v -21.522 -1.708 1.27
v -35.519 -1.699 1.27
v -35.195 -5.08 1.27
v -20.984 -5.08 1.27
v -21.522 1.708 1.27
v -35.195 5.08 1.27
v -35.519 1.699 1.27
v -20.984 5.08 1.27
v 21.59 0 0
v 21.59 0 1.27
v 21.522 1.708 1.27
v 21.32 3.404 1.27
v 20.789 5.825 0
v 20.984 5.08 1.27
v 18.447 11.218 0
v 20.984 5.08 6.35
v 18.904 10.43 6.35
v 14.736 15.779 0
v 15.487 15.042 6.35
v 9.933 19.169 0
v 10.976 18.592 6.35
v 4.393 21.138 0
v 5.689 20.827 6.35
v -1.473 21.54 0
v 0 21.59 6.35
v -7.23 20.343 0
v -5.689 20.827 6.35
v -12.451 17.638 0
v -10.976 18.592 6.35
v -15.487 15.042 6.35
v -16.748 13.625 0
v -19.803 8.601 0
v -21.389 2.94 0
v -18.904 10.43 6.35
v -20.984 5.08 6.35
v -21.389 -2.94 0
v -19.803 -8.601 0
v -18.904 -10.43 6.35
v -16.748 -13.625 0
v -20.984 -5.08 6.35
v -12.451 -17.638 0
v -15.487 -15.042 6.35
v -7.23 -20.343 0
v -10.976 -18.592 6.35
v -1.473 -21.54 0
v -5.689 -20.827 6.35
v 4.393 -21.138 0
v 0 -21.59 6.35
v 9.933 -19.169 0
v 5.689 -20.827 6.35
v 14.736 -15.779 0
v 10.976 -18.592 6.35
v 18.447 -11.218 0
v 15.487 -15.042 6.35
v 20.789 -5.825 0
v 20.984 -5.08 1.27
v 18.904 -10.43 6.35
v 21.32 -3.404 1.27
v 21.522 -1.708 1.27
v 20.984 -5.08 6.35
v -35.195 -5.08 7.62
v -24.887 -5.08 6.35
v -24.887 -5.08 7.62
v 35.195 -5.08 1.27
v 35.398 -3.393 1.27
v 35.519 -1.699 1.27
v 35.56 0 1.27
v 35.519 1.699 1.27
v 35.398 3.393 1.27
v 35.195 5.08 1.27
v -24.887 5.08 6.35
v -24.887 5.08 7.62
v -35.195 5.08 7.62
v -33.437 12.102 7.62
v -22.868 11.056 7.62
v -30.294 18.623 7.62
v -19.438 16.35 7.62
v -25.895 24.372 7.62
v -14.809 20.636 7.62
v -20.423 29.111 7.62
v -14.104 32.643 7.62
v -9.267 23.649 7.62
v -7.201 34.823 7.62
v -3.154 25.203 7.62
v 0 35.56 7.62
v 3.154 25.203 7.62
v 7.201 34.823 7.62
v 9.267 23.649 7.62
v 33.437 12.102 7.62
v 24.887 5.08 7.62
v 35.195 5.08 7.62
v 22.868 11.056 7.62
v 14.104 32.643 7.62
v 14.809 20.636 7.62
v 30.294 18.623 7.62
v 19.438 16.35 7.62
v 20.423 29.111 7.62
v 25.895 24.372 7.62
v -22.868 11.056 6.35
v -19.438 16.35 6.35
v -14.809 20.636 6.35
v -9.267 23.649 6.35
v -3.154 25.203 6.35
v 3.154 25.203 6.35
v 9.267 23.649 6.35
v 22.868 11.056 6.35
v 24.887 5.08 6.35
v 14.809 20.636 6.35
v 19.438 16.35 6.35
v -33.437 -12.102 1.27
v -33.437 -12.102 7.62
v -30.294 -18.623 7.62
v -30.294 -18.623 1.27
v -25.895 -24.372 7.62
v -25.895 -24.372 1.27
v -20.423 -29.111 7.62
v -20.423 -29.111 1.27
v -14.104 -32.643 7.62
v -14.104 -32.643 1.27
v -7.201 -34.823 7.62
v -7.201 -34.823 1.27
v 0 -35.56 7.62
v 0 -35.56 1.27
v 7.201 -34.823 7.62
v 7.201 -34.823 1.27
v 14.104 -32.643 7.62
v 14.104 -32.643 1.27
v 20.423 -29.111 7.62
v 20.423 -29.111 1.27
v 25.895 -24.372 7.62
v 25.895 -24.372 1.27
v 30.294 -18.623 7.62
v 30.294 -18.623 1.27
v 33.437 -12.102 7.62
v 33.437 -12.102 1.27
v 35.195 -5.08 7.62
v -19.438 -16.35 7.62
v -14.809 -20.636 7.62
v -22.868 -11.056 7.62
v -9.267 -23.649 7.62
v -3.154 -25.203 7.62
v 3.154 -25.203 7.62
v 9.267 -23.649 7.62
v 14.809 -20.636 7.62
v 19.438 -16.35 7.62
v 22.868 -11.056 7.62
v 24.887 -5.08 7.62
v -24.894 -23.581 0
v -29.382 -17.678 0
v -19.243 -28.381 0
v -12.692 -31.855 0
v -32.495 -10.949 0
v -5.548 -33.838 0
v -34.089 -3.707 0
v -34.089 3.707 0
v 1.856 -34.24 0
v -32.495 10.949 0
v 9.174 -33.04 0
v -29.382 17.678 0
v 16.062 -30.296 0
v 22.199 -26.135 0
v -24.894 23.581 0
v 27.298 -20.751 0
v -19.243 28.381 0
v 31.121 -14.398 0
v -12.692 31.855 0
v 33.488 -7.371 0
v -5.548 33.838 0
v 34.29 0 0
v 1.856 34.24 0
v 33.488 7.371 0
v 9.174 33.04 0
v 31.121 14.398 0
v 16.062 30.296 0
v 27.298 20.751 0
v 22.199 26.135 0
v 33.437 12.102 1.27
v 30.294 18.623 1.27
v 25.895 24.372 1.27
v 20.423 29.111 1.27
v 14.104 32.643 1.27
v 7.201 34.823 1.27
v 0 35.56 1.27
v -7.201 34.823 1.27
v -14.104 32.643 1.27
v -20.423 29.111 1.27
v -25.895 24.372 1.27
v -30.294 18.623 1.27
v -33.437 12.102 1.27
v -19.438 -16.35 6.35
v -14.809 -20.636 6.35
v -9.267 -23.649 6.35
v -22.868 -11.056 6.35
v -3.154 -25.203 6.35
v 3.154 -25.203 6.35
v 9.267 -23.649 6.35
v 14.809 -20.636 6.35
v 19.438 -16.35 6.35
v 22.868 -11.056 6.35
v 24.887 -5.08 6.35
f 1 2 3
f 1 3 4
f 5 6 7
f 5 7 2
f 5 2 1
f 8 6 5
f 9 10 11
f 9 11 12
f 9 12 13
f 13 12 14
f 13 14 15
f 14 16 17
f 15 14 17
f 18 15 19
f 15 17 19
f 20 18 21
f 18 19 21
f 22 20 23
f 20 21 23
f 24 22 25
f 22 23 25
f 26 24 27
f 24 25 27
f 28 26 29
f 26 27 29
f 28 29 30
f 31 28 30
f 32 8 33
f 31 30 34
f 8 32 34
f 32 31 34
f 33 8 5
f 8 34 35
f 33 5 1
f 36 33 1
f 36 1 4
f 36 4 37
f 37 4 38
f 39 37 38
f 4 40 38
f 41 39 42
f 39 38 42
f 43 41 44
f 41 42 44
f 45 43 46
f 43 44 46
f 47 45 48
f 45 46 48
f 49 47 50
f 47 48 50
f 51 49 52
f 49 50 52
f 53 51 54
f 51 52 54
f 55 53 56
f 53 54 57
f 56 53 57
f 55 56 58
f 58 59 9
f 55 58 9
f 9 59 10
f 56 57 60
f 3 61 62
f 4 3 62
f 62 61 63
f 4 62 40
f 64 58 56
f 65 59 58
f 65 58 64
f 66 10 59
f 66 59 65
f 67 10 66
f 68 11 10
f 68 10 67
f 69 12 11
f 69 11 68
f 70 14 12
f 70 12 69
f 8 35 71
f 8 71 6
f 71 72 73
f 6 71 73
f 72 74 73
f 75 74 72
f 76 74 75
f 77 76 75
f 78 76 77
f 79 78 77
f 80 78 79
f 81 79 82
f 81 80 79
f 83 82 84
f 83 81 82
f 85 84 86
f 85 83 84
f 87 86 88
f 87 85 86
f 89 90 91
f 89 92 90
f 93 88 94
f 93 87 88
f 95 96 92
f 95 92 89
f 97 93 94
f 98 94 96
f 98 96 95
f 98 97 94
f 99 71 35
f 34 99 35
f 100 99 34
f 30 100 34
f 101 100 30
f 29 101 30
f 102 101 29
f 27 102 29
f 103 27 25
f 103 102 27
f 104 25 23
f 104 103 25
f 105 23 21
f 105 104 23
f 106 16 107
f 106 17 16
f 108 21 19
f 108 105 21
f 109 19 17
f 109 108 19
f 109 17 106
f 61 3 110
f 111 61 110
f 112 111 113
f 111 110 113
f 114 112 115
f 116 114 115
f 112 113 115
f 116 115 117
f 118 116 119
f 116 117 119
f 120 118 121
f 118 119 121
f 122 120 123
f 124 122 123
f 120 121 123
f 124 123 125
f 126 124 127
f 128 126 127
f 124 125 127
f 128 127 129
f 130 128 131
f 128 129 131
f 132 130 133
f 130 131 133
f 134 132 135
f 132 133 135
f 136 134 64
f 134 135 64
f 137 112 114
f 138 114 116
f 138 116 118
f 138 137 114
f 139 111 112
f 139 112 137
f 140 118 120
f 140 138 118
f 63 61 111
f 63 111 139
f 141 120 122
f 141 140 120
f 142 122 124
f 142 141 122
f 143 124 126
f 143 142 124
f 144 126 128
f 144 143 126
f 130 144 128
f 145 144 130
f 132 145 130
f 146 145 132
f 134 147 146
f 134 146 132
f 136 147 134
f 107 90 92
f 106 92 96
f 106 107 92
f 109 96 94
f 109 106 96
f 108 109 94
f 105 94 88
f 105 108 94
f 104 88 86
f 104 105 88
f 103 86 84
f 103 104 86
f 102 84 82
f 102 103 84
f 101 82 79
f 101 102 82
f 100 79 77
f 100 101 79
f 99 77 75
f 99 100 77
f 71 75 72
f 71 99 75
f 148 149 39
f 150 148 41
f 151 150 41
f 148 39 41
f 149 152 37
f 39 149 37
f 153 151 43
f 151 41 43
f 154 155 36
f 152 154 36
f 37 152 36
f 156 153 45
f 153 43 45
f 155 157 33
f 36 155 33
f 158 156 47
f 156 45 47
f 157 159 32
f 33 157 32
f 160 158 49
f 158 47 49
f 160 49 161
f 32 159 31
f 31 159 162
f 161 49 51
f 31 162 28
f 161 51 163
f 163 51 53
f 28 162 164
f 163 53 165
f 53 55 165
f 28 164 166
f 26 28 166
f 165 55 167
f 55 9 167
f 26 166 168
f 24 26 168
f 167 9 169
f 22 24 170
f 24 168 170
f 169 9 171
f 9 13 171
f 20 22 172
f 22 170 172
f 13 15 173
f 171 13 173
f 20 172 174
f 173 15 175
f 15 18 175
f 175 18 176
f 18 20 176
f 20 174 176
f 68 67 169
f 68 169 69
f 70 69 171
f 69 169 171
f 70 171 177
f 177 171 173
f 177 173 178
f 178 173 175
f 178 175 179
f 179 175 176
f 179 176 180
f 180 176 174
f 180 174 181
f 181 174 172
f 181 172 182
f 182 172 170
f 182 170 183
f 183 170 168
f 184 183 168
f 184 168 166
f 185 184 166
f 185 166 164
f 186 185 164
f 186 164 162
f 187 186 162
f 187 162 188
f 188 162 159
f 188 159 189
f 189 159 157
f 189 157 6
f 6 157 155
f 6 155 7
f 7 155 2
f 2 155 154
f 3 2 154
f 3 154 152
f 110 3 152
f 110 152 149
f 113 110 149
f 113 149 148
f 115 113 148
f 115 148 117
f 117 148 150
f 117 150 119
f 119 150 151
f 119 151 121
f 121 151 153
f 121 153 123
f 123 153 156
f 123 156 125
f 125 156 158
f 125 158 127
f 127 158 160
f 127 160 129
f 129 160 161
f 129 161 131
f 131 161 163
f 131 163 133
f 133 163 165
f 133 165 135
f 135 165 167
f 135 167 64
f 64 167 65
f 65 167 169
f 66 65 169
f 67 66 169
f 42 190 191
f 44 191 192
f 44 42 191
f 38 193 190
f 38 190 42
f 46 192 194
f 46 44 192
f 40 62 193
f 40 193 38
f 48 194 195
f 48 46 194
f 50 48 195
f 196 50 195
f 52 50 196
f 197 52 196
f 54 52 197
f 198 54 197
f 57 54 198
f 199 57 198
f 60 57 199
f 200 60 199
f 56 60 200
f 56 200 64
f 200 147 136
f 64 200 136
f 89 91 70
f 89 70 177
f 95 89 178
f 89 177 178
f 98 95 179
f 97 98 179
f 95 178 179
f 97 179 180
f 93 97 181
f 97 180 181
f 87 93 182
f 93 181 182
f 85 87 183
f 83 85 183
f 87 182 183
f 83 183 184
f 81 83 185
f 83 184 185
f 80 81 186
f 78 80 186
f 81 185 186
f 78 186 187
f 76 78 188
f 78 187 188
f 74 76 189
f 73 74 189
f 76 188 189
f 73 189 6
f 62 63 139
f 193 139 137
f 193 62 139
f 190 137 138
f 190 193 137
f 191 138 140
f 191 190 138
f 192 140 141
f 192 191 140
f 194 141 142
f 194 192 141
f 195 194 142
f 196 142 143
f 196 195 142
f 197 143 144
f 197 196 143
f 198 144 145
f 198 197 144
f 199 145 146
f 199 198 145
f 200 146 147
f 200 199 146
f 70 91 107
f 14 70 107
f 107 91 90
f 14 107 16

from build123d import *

# Parameters (mm, degrees)
F0_R     = 35.56
F1_DEPTH = 6.35
F2_R     = 35.56
F2_R_2   = 25.4
F3_DEPTH = 1.27
F4_SIZE  = 1.27
F5_R     = 21.59
F6_DEPTH = 25.4
F8_DEPTH = 6.35


with BuildPart() as f1:
    # F0 (on Top) → F1 (new body)
    with BuildSketch(Plane.XY):
        Circle(F0_R)
    extrude(amount=F1_DEPTH)

    # F2 (on face) → F3 (join)
    with BuildSketch(Plane.XY.offset(6.35)):
        Circle(F2_R)
        Circle(F2_R_2, mode=Mode.SUBTRACT)
    extrude(amount=F3_DEPTH)

    # F4
    f4_edges = [f1.edges().sort_by_distance(p)[0] for p in [
        (-35.56, 0, 0),
    ]]
    chamfer(f4_edges, length=F4_SIZE)

    # F5 (on face) → F6 (cut)
    with BuildSketch(Plane.XY.offset(6.35)):
        Circle(F5_R)
    extrude(amount=-F6_DEPTH, mode=Mode.SUBTRACT)

    # F7 (on face) → F8 (cut)
    with BuildSketch(Plane.XY.offset(7.62)):
        with BuildLine():
            ThreePointArc((-35.1952724098, 5.08), (-35.56, 0), (-35.1952724098, -5.08))
            Line((-35.1952724098, -5.08), (-24.8868157867, -5.08))
            ThreePointArc((-24.8868157867, -5.08), (-25.4, 0), (-24.8868157867, 5.08))
            Line((-24.8868157867, 5.08), (-35.1952724098, 5.08))
        make_face()
        with BuildLine():
            Line((-24.8868157867, -5.08), (24.8868157867, -5.08))
            ThreePointArc((24.8868157867, -5.08), (25.2713782863, -2.5529276349), (25.4, 0))
            ThreePointArc((25.4, 0), (25.2713782863, 2.5529276349), (24.8868157867, 5.08))
            Line((24.8868157867, 5.08), (-24.8868157867, 5.08))
            ThreePointArc((-24.8868157867, 5.08), (-25.4, 0), (-24.8868157867, -5.08))
        make_face()
        with BuildLine():
            Line((24.8868157867, -5.08), (35.1952724098, -5.08))
            ThreePointArc((35.1952724098, -5.08), (35.4687008988, -2.5465381509), (35.56, 0))
            ThreePointArc((35.56, 0), (35.4687008988, 2.5465381509), (35.1952724098, 5.08))
            Line((35.1952724098, 5.08), (24.8868157867, 5.08))
            ThreePointArc((24.8868157867, 5.08), (25.2713782863, 2.5529276349), (25.4, 0))
            ThreePointArc((25.4, 0), (25.2713782863, -2.5529276349), (24.8868157867, -5.08))
        make_face()
    extrude(amount=-F8_DEPTH, mode=Mode.SUBTRACT)


solid = f1.part
